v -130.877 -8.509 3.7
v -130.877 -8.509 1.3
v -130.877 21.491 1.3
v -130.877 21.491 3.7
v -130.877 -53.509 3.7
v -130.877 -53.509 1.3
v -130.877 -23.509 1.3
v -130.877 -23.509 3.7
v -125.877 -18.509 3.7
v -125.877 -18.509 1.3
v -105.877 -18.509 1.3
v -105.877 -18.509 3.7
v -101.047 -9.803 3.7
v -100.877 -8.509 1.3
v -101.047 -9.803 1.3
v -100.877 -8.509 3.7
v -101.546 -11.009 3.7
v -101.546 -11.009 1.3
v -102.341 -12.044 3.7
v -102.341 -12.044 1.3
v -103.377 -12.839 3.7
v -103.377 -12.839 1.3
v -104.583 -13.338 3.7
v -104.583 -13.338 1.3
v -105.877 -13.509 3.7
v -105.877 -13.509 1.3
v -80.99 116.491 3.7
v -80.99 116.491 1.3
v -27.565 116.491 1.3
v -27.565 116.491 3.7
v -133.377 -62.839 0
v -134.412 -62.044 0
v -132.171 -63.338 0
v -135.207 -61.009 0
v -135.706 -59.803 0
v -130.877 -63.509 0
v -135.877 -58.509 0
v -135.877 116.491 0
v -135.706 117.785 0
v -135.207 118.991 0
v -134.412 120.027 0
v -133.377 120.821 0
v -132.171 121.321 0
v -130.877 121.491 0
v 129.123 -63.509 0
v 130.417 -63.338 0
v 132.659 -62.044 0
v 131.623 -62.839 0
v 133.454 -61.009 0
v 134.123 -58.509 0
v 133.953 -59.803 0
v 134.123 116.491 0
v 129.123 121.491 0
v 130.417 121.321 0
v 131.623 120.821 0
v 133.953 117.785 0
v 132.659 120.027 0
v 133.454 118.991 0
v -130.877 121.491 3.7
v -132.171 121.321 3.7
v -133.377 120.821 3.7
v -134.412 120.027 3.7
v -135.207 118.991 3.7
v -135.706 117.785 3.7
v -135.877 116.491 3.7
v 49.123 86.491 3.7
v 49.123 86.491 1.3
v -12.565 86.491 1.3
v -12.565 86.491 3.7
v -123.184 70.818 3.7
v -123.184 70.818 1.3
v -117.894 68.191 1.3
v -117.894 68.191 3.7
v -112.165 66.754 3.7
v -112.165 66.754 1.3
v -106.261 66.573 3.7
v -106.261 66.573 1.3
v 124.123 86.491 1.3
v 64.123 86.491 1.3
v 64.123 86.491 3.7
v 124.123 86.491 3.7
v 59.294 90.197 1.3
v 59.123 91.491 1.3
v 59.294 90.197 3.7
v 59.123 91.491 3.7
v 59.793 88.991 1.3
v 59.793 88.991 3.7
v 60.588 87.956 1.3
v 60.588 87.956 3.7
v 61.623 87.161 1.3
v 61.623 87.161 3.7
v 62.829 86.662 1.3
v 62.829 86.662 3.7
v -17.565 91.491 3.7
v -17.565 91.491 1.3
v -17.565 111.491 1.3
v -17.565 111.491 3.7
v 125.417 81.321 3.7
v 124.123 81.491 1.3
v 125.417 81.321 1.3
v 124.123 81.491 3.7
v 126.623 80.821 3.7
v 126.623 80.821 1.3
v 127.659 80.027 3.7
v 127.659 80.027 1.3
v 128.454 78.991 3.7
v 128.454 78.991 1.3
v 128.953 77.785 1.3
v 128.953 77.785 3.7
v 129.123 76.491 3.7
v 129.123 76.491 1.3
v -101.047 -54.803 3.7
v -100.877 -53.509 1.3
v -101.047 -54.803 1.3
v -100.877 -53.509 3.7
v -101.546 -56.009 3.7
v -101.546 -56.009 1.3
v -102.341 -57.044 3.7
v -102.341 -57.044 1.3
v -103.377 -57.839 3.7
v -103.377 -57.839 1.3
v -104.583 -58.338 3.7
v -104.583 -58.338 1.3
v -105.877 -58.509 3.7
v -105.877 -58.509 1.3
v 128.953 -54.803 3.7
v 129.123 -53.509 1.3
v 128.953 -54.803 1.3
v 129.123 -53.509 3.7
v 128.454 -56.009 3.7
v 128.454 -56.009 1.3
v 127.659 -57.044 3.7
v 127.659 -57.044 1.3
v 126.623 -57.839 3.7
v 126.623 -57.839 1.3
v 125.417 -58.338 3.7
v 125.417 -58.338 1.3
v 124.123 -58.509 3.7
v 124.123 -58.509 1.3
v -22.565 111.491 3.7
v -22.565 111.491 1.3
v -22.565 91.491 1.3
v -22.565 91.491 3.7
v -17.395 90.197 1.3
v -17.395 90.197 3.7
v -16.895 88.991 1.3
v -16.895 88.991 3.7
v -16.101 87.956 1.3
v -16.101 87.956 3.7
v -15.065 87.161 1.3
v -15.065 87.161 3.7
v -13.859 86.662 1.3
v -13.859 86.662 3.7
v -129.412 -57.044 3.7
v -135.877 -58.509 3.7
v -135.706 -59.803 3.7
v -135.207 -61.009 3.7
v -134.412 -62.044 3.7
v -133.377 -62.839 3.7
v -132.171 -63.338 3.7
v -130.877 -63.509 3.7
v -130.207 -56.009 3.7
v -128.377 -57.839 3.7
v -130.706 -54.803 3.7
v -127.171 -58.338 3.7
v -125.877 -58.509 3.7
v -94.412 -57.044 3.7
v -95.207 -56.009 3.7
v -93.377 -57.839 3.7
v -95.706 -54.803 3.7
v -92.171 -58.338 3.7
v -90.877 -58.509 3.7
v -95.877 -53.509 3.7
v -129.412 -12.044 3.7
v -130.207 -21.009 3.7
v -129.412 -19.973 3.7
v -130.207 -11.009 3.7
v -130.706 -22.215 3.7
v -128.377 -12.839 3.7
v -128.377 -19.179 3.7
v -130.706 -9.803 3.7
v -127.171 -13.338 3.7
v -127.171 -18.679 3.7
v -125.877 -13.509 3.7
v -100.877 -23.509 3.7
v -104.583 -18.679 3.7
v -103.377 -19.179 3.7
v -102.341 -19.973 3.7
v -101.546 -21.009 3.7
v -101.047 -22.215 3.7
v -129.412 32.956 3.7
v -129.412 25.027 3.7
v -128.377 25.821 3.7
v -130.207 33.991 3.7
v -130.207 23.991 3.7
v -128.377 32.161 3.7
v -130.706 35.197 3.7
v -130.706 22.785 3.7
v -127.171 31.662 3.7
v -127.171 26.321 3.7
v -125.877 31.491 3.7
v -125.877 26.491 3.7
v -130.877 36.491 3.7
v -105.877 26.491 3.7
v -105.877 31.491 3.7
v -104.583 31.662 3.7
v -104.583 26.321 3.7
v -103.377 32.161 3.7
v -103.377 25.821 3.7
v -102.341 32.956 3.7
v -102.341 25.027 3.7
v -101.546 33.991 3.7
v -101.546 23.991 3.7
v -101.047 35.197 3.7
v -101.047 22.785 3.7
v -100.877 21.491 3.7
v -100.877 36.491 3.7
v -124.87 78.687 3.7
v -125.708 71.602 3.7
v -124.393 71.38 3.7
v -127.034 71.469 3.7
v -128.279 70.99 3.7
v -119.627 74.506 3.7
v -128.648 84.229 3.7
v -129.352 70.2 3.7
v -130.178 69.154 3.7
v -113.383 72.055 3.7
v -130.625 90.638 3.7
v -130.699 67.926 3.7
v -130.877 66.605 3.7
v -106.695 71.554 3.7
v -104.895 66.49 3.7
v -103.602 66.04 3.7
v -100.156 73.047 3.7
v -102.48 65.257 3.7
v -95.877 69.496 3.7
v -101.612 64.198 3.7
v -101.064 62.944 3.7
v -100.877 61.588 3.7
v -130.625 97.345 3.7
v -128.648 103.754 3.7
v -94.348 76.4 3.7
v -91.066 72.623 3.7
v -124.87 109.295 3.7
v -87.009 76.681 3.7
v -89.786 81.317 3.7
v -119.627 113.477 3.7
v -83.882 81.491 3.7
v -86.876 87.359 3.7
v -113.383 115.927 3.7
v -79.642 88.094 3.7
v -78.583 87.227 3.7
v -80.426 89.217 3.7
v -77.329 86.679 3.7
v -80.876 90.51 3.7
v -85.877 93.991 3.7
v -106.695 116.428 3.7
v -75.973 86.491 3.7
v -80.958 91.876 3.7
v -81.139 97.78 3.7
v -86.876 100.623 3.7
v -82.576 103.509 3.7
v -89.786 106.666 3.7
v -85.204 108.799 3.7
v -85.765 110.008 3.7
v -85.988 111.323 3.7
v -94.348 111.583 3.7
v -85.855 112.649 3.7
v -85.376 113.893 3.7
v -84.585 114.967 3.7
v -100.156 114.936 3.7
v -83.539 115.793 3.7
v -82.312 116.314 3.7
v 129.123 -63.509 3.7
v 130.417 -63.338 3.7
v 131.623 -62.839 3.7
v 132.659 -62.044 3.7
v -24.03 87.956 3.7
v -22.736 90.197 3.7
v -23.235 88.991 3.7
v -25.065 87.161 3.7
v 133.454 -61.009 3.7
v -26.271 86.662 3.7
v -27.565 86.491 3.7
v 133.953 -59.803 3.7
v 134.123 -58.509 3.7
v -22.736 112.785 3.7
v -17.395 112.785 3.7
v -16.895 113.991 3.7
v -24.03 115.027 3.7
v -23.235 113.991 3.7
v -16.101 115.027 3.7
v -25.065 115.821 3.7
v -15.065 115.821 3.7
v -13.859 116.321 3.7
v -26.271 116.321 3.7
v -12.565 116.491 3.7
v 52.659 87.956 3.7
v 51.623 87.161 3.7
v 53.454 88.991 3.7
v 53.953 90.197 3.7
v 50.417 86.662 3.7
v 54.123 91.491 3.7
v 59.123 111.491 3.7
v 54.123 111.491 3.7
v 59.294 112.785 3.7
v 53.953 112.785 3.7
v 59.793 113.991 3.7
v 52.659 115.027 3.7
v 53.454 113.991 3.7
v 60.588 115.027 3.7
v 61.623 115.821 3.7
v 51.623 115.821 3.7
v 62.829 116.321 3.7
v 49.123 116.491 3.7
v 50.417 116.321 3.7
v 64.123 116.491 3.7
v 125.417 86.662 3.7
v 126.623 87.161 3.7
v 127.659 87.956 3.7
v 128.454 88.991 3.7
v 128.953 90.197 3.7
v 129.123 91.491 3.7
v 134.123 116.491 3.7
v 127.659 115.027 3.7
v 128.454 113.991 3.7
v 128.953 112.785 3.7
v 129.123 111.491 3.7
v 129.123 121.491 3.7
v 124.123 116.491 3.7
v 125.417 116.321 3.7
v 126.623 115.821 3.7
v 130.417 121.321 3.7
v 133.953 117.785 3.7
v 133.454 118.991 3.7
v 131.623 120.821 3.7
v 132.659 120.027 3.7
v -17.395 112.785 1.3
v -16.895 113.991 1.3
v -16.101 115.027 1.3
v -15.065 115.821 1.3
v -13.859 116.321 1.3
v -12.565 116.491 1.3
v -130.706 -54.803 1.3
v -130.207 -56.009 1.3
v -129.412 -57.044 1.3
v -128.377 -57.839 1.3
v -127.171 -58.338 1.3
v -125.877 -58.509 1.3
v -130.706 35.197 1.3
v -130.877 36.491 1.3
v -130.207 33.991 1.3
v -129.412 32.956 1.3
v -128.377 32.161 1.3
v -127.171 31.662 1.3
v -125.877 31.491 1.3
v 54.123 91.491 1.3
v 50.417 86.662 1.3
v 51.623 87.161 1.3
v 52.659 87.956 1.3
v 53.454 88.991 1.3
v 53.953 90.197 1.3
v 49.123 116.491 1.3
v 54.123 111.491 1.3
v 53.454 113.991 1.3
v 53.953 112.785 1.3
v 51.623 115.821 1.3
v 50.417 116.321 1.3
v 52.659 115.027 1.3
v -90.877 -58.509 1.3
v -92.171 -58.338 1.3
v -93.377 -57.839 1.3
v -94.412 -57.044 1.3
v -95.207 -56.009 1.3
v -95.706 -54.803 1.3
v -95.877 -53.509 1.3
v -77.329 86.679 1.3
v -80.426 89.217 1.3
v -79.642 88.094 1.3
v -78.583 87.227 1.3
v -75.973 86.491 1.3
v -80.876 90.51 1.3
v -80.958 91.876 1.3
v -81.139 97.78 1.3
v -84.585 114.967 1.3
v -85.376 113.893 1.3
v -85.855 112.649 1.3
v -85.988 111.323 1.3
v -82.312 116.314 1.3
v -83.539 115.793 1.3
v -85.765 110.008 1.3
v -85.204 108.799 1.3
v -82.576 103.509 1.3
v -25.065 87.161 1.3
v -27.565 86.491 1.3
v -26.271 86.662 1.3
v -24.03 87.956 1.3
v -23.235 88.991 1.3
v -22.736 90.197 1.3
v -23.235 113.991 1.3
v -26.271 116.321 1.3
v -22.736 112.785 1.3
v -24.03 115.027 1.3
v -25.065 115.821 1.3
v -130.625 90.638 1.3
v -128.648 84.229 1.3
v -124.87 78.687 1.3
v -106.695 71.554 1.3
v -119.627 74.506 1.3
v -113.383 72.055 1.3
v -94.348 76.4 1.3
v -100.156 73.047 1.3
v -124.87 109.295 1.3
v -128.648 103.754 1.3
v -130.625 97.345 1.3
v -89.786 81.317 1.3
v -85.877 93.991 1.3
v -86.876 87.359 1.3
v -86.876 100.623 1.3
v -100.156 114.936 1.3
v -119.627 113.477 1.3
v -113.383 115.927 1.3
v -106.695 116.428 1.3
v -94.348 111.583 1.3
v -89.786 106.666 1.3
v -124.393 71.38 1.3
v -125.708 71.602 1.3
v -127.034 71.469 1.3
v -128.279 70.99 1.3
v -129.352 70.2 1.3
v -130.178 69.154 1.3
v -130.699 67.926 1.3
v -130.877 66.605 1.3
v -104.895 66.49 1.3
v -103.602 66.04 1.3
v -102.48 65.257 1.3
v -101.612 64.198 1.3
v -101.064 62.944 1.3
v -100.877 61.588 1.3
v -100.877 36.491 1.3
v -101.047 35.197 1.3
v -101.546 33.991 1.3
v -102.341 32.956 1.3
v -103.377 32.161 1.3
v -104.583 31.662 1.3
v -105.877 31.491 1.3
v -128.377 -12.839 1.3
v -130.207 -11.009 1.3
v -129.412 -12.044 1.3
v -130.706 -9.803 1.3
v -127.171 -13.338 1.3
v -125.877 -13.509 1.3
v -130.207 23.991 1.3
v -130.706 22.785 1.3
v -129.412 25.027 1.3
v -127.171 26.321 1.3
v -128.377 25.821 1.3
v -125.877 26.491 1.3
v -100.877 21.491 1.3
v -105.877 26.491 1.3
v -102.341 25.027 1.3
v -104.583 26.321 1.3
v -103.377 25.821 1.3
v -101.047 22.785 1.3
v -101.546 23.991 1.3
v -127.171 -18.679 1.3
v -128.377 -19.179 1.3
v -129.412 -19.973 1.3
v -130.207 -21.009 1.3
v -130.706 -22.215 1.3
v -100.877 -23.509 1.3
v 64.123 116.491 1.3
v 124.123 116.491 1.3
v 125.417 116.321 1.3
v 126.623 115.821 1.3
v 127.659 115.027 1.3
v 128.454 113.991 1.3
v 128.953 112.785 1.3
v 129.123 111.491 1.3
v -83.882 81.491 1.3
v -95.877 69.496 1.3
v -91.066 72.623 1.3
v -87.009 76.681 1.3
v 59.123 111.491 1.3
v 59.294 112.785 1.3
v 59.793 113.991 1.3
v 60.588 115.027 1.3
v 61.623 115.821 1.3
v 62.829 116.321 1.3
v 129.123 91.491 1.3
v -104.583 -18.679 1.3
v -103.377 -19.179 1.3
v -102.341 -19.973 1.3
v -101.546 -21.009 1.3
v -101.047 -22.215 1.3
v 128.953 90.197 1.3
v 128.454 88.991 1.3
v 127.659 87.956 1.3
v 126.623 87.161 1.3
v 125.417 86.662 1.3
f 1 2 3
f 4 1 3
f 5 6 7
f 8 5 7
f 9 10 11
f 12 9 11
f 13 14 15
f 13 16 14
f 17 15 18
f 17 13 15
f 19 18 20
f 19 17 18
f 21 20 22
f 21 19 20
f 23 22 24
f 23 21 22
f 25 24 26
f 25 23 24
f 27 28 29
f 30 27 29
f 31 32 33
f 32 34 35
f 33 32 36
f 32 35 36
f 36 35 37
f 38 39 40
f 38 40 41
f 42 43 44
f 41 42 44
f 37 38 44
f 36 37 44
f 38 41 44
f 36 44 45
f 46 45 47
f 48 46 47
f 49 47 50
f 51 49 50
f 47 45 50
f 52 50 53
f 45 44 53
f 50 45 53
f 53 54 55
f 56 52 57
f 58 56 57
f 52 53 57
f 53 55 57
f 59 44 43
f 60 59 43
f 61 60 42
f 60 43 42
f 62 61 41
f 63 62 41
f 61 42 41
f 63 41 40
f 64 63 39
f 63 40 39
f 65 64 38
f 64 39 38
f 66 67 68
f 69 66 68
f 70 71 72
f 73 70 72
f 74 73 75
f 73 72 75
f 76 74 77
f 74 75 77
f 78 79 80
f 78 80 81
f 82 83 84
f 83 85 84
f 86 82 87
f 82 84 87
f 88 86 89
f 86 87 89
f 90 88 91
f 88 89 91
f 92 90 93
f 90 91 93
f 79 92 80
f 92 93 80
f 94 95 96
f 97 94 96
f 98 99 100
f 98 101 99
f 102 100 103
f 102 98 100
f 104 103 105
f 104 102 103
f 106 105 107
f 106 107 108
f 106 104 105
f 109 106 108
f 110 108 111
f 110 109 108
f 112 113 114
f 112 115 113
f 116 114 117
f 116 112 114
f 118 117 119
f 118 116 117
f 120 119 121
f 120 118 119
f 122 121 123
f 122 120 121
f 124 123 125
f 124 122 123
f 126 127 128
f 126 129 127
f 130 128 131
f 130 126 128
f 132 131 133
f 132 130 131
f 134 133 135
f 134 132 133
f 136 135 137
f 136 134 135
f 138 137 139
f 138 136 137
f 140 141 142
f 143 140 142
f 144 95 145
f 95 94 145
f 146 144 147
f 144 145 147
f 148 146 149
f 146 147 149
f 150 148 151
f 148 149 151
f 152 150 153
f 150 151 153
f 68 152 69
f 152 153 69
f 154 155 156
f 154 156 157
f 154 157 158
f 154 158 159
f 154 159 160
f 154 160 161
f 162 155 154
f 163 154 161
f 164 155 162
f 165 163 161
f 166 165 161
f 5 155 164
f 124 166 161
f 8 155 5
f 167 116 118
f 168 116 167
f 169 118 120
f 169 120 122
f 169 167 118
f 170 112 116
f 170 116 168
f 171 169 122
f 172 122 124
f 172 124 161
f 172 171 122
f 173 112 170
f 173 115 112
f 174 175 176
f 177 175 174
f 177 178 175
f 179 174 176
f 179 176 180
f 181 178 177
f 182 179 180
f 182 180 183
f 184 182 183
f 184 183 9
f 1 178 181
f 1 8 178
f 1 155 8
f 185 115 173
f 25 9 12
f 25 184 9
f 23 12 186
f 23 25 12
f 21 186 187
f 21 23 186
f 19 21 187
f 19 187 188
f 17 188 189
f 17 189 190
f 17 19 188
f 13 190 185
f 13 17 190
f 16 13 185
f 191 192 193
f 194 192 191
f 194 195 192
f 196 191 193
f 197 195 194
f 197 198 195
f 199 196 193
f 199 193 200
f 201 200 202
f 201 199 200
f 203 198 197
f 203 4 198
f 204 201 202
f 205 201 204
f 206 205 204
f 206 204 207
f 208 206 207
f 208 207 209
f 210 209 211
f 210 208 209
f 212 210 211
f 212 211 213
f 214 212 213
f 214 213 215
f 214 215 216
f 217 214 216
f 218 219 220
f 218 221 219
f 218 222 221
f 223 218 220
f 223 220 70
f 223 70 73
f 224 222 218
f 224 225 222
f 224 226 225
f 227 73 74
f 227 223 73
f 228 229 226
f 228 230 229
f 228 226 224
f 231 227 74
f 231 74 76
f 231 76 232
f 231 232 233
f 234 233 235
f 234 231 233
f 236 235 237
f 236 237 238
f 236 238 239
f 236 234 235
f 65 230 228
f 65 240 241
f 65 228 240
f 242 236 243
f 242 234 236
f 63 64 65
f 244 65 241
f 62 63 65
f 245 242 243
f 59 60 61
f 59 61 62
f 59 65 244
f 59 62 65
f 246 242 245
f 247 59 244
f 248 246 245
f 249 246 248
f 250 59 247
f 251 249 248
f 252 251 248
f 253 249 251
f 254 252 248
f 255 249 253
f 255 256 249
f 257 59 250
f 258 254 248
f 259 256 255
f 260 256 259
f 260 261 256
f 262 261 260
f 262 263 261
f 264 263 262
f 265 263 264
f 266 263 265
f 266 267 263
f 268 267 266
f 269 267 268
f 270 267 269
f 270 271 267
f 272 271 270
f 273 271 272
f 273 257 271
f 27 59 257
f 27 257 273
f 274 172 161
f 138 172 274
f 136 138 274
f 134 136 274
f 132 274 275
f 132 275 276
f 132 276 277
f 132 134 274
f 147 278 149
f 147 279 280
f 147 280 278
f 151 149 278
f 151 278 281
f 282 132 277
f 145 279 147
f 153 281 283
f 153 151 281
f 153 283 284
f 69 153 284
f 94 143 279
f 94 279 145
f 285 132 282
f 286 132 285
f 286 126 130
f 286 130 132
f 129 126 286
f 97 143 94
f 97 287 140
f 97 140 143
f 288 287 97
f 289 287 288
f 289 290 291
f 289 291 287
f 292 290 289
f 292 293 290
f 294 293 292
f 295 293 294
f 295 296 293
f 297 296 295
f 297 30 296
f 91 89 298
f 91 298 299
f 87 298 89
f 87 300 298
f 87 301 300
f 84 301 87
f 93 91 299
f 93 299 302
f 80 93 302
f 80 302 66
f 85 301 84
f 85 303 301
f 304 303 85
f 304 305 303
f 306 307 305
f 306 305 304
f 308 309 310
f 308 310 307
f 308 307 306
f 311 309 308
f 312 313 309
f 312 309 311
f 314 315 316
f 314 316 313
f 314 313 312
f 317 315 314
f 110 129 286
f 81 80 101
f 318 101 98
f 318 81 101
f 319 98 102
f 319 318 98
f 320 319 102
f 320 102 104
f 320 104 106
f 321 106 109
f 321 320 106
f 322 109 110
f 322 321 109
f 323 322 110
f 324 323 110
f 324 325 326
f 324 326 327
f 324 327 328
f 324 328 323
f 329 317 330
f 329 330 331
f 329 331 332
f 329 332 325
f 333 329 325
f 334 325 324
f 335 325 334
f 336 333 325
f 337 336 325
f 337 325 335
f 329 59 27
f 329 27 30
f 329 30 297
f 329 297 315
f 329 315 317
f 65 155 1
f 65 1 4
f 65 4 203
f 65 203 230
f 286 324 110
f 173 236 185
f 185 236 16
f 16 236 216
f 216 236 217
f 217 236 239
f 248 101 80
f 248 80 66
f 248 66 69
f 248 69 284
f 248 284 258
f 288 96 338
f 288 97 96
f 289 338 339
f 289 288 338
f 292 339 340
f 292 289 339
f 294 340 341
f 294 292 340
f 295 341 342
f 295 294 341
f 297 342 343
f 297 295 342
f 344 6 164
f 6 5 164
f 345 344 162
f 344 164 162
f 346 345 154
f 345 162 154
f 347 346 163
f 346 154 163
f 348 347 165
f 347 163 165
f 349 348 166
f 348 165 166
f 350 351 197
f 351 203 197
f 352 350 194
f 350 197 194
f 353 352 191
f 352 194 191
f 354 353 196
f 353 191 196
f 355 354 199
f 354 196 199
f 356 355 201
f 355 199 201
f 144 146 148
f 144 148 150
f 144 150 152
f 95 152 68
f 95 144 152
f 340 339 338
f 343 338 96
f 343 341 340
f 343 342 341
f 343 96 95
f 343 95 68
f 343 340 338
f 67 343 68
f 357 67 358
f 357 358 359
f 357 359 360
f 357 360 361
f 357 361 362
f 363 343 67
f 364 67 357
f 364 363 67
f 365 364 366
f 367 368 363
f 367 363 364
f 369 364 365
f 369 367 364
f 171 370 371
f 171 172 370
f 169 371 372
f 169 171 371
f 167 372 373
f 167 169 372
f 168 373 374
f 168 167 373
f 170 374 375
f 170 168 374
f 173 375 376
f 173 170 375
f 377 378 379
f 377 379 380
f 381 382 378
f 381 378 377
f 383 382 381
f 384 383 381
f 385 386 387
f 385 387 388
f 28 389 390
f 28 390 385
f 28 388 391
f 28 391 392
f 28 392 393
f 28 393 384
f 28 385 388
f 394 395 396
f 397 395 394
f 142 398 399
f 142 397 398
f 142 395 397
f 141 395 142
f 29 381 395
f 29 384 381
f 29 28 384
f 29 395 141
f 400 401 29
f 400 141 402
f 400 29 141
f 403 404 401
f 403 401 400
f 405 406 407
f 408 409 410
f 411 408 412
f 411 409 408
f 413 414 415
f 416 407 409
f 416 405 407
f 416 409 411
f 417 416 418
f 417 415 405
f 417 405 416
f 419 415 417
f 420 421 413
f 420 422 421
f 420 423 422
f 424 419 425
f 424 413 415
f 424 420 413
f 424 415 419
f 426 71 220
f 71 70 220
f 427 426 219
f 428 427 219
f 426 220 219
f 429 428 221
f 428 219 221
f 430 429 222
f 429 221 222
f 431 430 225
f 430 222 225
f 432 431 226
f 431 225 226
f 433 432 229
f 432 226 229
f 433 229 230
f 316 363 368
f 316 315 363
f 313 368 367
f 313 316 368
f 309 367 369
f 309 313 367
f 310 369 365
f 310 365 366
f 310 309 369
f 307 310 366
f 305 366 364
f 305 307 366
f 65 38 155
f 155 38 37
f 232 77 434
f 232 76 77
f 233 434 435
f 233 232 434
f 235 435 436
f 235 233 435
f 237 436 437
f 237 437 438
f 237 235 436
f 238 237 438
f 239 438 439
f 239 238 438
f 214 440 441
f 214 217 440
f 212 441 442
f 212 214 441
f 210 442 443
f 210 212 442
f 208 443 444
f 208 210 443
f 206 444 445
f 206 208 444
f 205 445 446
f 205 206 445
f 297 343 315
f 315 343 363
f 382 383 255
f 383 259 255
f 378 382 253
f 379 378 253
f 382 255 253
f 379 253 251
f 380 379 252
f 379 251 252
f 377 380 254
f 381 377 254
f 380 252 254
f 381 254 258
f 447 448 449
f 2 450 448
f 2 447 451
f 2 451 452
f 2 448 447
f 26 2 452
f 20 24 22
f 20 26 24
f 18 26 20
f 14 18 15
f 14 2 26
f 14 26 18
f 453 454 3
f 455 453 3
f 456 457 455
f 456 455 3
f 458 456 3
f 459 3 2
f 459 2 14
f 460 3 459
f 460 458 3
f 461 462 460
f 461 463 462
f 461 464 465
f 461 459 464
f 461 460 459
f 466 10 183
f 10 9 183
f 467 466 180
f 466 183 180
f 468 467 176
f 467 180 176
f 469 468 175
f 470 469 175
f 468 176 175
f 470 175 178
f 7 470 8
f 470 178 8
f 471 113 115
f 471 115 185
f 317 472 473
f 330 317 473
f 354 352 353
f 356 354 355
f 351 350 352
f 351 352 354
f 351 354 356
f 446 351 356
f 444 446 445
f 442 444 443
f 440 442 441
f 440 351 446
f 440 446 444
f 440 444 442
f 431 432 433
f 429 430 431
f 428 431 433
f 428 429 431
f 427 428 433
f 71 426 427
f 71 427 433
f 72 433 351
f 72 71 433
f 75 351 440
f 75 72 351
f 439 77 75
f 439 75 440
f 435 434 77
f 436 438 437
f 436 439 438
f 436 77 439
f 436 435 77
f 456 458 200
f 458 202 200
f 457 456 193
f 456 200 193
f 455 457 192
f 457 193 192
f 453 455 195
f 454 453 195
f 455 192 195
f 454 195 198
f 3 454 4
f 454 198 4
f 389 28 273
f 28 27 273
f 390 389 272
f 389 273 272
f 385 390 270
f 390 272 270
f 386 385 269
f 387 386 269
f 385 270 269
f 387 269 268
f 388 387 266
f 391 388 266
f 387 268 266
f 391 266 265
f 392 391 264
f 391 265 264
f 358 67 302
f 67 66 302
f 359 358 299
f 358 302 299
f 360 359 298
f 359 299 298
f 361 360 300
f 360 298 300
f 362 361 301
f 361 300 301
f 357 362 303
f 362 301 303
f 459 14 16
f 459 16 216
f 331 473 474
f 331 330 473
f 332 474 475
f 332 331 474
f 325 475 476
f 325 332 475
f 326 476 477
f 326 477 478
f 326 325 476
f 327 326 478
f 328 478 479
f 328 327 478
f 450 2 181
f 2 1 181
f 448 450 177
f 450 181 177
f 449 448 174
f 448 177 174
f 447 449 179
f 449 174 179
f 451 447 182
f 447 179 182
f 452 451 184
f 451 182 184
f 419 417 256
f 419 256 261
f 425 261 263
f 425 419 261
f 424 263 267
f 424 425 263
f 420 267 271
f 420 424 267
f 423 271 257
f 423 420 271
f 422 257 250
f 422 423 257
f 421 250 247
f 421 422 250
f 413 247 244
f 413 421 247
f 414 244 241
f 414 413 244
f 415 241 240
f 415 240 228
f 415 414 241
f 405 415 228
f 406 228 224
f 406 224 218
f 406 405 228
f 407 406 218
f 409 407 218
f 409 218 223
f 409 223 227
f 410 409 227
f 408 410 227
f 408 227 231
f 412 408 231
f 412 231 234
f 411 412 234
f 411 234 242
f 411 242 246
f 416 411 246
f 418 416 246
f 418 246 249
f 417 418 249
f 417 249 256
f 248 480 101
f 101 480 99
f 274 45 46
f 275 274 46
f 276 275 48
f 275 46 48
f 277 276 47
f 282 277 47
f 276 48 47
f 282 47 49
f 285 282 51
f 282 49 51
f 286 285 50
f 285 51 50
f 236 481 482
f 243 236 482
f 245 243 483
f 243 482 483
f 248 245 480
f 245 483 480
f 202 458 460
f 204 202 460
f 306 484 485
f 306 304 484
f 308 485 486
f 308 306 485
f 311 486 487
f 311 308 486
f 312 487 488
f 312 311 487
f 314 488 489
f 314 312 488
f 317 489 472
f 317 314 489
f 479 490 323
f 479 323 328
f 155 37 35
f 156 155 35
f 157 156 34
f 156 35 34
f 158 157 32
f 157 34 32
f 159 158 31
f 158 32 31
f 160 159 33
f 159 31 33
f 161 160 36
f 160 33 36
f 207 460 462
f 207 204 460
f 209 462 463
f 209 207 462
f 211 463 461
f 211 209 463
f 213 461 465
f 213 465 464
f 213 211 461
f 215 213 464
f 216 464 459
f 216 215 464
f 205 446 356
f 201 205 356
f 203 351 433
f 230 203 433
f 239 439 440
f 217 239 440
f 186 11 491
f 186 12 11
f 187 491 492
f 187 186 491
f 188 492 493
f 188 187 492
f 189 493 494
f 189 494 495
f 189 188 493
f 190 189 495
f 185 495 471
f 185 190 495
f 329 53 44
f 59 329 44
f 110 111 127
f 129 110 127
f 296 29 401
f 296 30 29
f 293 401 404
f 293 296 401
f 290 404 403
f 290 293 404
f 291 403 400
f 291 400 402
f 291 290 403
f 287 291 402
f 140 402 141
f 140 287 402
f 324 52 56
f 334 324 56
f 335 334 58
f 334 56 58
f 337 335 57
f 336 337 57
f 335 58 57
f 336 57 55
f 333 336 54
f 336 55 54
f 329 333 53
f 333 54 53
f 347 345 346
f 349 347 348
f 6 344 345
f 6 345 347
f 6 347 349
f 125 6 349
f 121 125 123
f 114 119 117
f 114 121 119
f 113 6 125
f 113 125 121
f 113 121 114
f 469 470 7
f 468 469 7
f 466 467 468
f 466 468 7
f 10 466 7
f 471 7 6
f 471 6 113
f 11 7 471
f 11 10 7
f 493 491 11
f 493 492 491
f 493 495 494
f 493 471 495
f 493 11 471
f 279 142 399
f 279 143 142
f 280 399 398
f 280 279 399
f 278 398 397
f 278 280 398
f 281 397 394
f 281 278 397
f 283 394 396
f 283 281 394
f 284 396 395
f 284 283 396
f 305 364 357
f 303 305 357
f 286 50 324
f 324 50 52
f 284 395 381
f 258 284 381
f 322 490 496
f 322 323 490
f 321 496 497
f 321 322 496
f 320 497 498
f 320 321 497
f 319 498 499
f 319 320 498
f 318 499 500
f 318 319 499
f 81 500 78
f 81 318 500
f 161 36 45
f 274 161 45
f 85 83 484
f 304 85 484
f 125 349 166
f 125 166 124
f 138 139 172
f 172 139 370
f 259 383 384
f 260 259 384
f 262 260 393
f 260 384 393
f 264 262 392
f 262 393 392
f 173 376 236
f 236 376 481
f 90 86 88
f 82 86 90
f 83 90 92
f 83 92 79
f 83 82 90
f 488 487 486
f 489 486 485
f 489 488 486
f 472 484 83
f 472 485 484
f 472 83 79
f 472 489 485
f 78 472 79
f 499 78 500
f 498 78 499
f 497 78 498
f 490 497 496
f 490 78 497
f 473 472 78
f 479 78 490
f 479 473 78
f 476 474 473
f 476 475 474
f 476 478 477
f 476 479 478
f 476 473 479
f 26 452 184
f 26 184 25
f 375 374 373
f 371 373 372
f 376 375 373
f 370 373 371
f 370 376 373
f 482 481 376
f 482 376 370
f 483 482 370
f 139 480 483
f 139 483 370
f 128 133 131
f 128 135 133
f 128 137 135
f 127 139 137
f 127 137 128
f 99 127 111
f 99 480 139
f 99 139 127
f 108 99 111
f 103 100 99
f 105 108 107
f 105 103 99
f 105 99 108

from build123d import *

# Parameters (mm, degrees)
F0_W     = 30
F0_H     = 40
F0_R     = 22.5
F0_W_2   = 70
F0_H_2   = 30
F1_DEPTH = 3.7
F2_DEPTH = 1.3
F3_R     = 5


with BuildPart() as f1:
    # F0 (on Top) → F1 (new body)
    with BuildSketch(Plane.XY):
        with BuildLine():
            Line((129.123384, 121.491298), (-130.876616, 121.491298))
            ThreePointArc((-130.876616, 121.491298), (-134.41215, 120.026832), (-135.876616, 116.491298))
            Line((-135.876616, 116.491298), (-135.876616, -58.508702))
            ThreePointArc((-135.876616, -58.508702), (-134.41215, -62.044236), (-130.876616, -63.508702))
            Line((-130.876616, -63.508702), (129.123384, -63.508702))
            ThreePointArc((129.123384, -63.508702), (132.658918, -62.044236), (134.123384, -58.508702))
            Line((134.123384, -58.508702), (134.123384, 116.491298))
            ThreePointArc((134.123384, 116.491298), (132.658918, 120.026832), (129.123384, 121.491298))
        make_face()
        with Locations((-115.876616, -38.508702)):
            Rectangle(F0_W, F0_H, mode=Mode.SUBTRACT)
        with Locations((-115.876616, 6.491298)):
            Rectangle(F0_W, F0_H, mode=Mode.SUBTRACT)
        with BuildLine():
            ThreePointArc((-95.876616, 69.4964), (-88.93118, 74.545861), (-83.881719, 81.491298))
            Line((-83.881719, 81.491298), (129.123384, 81.491298))
            Line((129.123384, 81.491298), (129.123384, -58.508702))
            Line((129.123384, -58.508702), (-95.876616, -58.508702))
            Line((-95.876616, -58.508702), (-95.876616, 69.4964))
        make_face(mode=Mode.SUBTRACT)
        with BuildLine():
            Line((-130.876616, 31.491298), (-130.876616, 78.179909))
            ThreePointArc((-130.876616, 78.179909), (-117.573626, 68.074797), (-100.876616, 67.533784))
            Line((-100.876616, 67.533784), (-100.876616, 31.491298))
            Line((-100.876616, 31.491298), (-130.876616, 31.491298))
        make_face(mode=Mode.SUBTRACT)
        with Locations((-108.376616, 93.991298)):
            Circle(F0_R, mode=Mode.SUBTRACT)
        with BuildLine():
            Line((-23.623535, 86.491298), (-81.919103, 86.491298))
            ThreePointArc((-81.919103, 86.491298), (-82.460116, 103.188308), (-92.565228, 116.491298))
            Line((-92.565228, 116.491298), (-23.623535, 116.491298))
            Line((-23.623535, 116.491298), (-22.565228, 116.491298))
            Line((-22.565228, 116.491298), (-22.565228, 86.491298))
            Line((-22.565228, 86.491298), (-23.623535, 86.491298))
        make_face(mode=Mode.SUBTRACT)
        Polygon((54.123384, 86.491298), (12.149697, 86.491298), (-17.565228, 86.491298), (-17.565228, 116.491298), (54.123384, 116.491298), align=None, mode=Mode.SUBTRACT)
        with Locations((94.123384, 101.491298)):
            Rectangle(F0_W_2, F0_H_2, mode=Mode.SUBTRACT)
    extrude(amount=F1_DEPTH)

    # F0 (on Top) → F2 (join)
    with BuildSketch(Plane.XY):
        with BuildLine():
            Line((129.123384, 121.491298), (-130.876616, 121.491298))
            ThreePointArc((-130.876616, 121.491298), (-134.41215, 120.026832), (-135.876616, 116.491298))
            Line((-135.876616, 116.491298), (-135.876616, -58.508702))
            ThreePointArc((-135.876616, -58.508702), (-134.41215, -62.044236), (-130.876616, -63.508702))
            Line((-130.876616, -63.508702), (129.123384, -63.508702))
            ThreePointArc((129.123384, -63.508702), (132.658918, -62.044236), (134.123384, -58.508702))
            Line((134.123384, -58.508702), (134.123384, 116.491298))
            ThreePointArc((134.123384, 116.491298), (132.658918, 120.026832), (129.123384, 121.491298))
        make_face()
        with Locations((-115.876616, -38.508702)):
            Rectangle(F0_W, F0_H, mode=Mode.SUBTRACT)
        with Locations((-115.876616, 6.491298)):
            Rectangle(F0_W, F0_H, mode=Mode.SUBTRACT)
        with BuildLine():
            ThreePointArc((-95.876616, 69.4964), (-88.93118, 74.545861), (-83.881719, 81.491298))
            Line((-83.881719, 81.491298), (129.123384, 81.491298))
            Line((129.123384, 81.491298), (129.123384, -58.508702))
            Line((129.123384, -58.508702), (-95.876616, -58.508702))
            Line((-95.876616, -58.508702), (-95.876616, 69.4964))
        make_face(mode=Mode.SUBTRACT)
        with BuildLine():
            Line((-130.876616, 31.491298), (-130.876616, 78.179909))
            ThreePointArc((-130.876616, 78.179909), (-117.573626, 68.074797), (-100.876616, 67.533784))
            Line((-100.876616, 67.533784), (-100.876616, 31.491298))
            Line((-100.876616, 31.491298), (-130.876616, 31.491298))
        make_face(mode=Mode.SUBTRACT)
        with Locations((-108.376616, 93.991298)):
            Circle(F0_R, mode=Mode.SUBTRACT)
        with BuildLine():
            Line((-23.623535, 86.491298), (-81.919103, 86.491298))
            ThreePointArc((-81.919103, 86.491298), (-82.460116, 103.188308), (-92.565228, 116.491298))
            Line((-92.565228, 116.491298), (-23.623535, 116.491298))
            Line((-23.623535, 116.491298), (-22.565228, 116.491298))
            Line((-22.565228, 116.491298), (-22.565228, 86.491298))
            Line((-22.565228, 86.491298), (-23.623535, 86.491298))
        make_face(mode=Mode.SUBTRACT)
        Polygon((54.123384, 86.491298), (12.149697, 86.491298), (-17.565228, 86.491298), (-17.565228, 116.491298), (54.123384, 116.491298), align=None, mode=Mode.SUBTRACT)
        with Locations((94.123384, 101.491298)):
            Rectangle(F0_W_2, F0_H_2, mode=Mode.SUBTRACT)
        with BuildLine():
            Line((129.123384, 81.491298), (-83.881719, 81.491298))
            ThreePointArc((-83.881719, 81.491298), (-88.93118, 74.545861), (-95.876616, 69.4964))
            Line((-95.876616, 69.4964), (-95.876616, -58.508702))
            Line((-95.876616, -58.508702), (129.123384, -58.508702))
            Line((129.123384, -58.508702), (129.123384, 81.491298))
        make_face()
        with Locations((94.123384, 101.491298)):
            Rectangle(F0_W_2, F0_H_2)
        Polygon((-17.565228, 86.491298), (12.149697, 86.491298), (54.123384, 86.491298), (54.123384, 116.491298), (-17.565228, 116.491298), align=None)
        with BuildLine():
            ThreePointArc((-92.565228, 116.491298), (-82.460116, 103.188308), (-81.919103, 86.491298))
            Line((-81.919103, 86.491298), (-23.623535, 86.491298))
            Line((-23.623535, 86.491298), (-22.565228, 86.491298))
            Line((-22.565228, 86.491298), (-22.565228, 116.491298))
            Line((-22.565228, 116.491298), (-23.623535, 116.491298))
            Line((-23.623535, 116.491298), (-92.565228, 116.491298))
        make_face()
        with Locations((-108.376616, 93.991298)):
            Circle(F0_R)
        with BuildLine():
            ThreePointArc((-100.876616, 67.533784), (-117.573626, 68.074797), (-130.876616, 78.179909))
            Line((-130.876616, 78.179909), (-130.876616, 31.491298))
            Line((-130.876616, 31.491298), (-100.876616, 31.491298))
            Line((-100.876616, 31.491298), (-100.876616, 67.533784))
        make_face()
        with Locations((-115.876616, 6.491298)):
            Rectangle(F0_W, F0_H)
        with Locations((-115.876616, -38.508702)):
            Rectangle(F0_W, F0_H)
    extrude(amount=F2_DEPTH)

    # F3
    f3_edges = [f1.edges().sort_by_distance(p)[0] for p in [
        (59.123384, 116.491298, 2.5),
        (129.123384, 81.491298, 2.5),
        (129.123384, 116.491298, 2.5),
        (129.123384, 86.491298, 2.5),
        (59.123384, 86.491298, 2.5),
        (54.123384, 86.491298, 2.5),
        (54.123384, 116.491298, 2.5),
        (-17.565228, 86.491298, 2.5),
        (-81.919103, 86.491298, 2.5),
        (-130.876616, -13.508702, 2.5),
        (-100.876616, 26.491298, 2.5),
        (-100.876616, 67.533784, 2.5),
        (-100.876616, -18.508702, 2.5),
        (-130.876616, 26.491298, 2.5),
        (-130.876616, 78.179909, 2.5),
        (-92.565228, 116.491298, 2.5),
        (-17.565228, 116.491298, 2.5),
        (-130.876616, -58.508702, 2.5),
        (-130.876616, 31.491298, 2.5),
        (-100.876616, -13.508702, 2.5),
        (-100.876616, 31.491298, 2.5),
        (-100.876616, -58.508702, 2.5),
        (-95.876616, -58.508702, 2.5),
        (-130.876616, -18.508702, 2.5),
        (129.123384, -58.508702, 2.5),
        (-22.565228, 86.491298, 2.5),
        (-22.565228, 116.491298, 2.5),
    ]]
    fillet(f3_edges, radius=F3_R)


solid = f1.part
